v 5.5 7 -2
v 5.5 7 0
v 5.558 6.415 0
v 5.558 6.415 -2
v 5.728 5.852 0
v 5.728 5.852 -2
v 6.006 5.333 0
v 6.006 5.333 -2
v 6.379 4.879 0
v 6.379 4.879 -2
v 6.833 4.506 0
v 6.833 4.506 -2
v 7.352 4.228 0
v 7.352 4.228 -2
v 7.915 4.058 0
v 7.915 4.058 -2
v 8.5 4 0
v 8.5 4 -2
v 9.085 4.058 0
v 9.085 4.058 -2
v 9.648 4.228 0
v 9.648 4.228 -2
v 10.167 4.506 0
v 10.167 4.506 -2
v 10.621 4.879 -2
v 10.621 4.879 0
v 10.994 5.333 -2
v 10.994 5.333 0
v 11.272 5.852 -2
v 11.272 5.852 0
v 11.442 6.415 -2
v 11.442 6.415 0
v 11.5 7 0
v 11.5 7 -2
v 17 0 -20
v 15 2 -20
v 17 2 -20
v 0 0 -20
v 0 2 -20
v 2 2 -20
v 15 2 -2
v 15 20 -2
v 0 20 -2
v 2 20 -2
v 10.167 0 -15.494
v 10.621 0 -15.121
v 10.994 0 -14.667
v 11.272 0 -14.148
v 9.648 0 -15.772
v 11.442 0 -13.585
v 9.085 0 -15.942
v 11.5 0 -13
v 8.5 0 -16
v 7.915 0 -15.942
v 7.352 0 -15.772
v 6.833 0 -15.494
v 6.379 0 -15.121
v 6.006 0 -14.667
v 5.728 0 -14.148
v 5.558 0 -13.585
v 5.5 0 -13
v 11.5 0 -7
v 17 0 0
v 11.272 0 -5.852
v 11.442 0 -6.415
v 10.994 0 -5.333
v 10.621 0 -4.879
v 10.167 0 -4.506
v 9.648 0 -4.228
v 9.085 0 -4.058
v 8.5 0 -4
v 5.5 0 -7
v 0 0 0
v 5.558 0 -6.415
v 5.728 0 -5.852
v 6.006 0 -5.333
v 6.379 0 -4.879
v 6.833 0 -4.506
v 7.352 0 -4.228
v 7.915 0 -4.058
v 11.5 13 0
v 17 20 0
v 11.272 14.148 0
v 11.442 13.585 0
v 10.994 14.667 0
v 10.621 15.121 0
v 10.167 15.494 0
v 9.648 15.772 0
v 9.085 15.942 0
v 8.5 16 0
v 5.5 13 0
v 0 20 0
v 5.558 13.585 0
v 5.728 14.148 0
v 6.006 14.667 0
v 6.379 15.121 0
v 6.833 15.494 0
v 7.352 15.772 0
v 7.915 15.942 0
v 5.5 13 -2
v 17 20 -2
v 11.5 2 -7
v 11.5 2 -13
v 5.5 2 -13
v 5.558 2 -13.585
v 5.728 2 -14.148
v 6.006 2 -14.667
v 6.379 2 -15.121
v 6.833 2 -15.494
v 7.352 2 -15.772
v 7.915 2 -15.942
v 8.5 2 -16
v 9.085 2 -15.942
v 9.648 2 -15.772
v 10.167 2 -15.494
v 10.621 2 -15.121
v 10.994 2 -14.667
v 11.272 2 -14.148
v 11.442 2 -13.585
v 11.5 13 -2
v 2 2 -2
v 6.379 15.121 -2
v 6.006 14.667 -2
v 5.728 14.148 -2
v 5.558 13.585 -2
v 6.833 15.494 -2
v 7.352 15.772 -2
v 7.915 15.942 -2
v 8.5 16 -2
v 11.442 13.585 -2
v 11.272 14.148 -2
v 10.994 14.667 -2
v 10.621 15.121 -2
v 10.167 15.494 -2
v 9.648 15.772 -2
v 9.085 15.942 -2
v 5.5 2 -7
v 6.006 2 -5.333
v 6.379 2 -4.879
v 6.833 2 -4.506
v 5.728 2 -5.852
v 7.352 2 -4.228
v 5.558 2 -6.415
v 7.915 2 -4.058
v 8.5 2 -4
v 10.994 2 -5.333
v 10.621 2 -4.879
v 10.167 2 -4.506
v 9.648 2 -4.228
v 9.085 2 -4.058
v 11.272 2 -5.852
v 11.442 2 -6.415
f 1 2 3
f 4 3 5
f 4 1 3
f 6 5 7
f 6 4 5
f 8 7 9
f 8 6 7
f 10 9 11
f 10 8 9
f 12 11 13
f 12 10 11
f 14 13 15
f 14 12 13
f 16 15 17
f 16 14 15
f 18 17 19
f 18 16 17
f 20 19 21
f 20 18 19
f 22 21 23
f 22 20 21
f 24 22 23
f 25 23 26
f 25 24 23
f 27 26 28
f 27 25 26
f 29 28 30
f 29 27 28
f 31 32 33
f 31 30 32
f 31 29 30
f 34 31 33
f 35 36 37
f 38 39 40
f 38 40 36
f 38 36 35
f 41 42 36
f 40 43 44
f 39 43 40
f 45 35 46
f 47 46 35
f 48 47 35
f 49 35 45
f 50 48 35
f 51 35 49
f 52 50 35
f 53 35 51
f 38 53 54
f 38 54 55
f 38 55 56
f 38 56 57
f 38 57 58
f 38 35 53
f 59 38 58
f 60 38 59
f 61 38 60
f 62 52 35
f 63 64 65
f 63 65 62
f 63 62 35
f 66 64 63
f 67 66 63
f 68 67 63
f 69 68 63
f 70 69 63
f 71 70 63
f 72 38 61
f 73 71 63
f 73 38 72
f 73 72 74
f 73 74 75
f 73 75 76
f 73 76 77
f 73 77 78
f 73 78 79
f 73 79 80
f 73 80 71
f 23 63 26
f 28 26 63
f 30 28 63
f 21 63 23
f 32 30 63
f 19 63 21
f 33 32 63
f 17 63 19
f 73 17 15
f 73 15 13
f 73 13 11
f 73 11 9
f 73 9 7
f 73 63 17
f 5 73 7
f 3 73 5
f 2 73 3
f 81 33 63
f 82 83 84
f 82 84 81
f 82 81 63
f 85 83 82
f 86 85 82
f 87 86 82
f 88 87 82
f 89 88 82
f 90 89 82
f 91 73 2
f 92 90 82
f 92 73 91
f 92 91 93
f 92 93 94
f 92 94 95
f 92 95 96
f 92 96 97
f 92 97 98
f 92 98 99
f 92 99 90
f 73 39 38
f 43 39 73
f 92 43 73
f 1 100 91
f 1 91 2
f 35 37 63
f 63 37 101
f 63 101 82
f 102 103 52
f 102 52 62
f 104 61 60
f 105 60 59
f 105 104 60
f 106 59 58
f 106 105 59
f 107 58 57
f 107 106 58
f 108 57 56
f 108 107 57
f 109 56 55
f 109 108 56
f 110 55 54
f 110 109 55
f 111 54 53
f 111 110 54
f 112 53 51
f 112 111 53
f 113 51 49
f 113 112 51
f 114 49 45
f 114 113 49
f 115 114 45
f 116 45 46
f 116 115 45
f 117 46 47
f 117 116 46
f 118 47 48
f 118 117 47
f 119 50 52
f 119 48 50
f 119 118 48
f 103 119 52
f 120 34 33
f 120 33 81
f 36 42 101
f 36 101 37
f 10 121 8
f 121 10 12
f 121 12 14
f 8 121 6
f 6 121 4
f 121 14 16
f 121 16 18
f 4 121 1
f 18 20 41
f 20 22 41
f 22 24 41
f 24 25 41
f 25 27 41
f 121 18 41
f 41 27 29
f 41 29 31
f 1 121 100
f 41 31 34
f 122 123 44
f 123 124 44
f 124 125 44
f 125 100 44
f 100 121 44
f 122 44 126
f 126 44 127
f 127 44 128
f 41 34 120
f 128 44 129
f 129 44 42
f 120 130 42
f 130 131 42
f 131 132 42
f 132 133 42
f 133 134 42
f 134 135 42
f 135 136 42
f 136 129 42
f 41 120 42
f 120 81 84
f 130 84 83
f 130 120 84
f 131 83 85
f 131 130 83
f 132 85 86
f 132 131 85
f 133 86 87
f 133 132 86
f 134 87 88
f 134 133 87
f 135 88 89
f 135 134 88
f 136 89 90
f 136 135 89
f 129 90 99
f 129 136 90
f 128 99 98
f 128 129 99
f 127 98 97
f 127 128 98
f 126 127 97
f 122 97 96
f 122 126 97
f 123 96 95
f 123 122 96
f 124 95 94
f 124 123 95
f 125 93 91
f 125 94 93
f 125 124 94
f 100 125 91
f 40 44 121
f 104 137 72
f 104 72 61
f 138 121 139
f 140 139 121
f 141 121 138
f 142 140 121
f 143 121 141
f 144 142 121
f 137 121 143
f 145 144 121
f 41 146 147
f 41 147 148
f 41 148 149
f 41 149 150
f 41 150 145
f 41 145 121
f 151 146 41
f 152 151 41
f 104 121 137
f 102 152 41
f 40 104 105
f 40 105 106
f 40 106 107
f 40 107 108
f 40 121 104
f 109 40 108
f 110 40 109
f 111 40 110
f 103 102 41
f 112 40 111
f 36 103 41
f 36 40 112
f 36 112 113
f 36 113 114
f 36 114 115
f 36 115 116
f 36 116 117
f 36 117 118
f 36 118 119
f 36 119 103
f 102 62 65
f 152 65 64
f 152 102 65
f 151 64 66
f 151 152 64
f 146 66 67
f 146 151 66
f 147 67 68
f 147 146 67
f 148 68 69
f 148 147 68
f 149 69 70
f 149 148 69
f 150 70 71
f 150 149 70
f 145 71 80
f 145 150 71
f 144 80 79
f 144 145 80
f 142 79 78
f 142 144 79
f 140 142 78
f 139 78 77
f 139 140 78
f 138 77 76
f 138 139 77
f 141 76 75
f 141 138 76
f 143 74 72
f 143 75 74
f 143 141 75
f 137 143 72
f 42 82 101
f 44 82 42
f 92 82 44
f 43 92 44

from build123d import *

# Parameters (mm, degrees)
BOSS_EXTRUDE1_DEPTH = 17
SKETCH2_W           = 13
SKETCH2_H           = 18
CUT_EXTRUDE1_DEPTH  = 18
CUT_EXTRUDE2_REACH  = 33.828
CUT_EXTRUDE3_REACH  = 33.828


with BuildPart() as part:
    # Sketch1 → Boss-Extrude1 (new body)
    with BuildSketch(Plane(origin=(0, 0, 0), x_dir=(0, 0, -1), z_dir=(1, 0, 0))):
        Polygon((0, 0), (0, 20), (2, 20), (20, 2), (20, 0), align=None)
    extrude(amount=BOSS_EXTRUDE1_DEPTH)

    # Sketch2 → Cut-Extrude1 (cut)
    with BuildSketch(Plane(origin=(0, 20, 0), x_dir=(1, 0, 0), z_dir=(0, 1, 0))):
        with Locations((8.5, 11)):
            Rectangle(SKETCH2_W, SKETCH2_H)
    extrude(amount=-CUT_EXTRUDE1_DEPTH, mode=Mode.SUBTRACT)

    # Sketch3 → Cut-Extrude2 (cut, up to next)
    with BuildSketch(Plane(origin=(0, 0, -2), x_dir=(-1, 0, 0), z_dir=(0, 0, -1)), mode=Mode.PRIVATE) as cut_extrude2_sk1:
        with BuildLine():
            Line((-11.5, 7), (-11.5, 13))
            ThreePointArc((-11.5, 13), (-8.5, 16), (-5.5, 13))
            Line((-5.5, 13), (-5.5, 7))
            ThreePointArc((-5.5, 7), (-8.5, 4), (-11.5, 7))
        make_face()
    cut_extrude2_tool1 = extrude(cut_extrude2_sk1.sketch, amount=-CUT_EXTRUDE2_REACH, mode=Mode.PRIVATE) & part.part
    add(cut_extrude2_tool1.solids().sort_by_distance((8.5, 10, -2))[0], mode=Mode.SUBTRACT)

    # Sketch4 → Cut-Extrude3 (cut, up to next)
    with BuildSketch(Plane(origin=(0, 2, 0), x_dir=(1, 0, 0), z_dir=(0, 1, 0)), mode=Mode.PRIVATE) as cut_extrude3_sk1:
        with BuildLine():
            Line((11.5, 13), (11.5, 7))
            ThreePointArc((11.5, 7), (8.5, 4), (5.5, 7))
            Line((5.5, 7), (5.5, 13))
            ThreePointArc((5.5, 13), (8.5, 16), (11.5, 13))
        make_face()
    cut_extrude3_tool1 = extrude(cut_extrude3_sk1.sketch, amount=-CUT_EXTRUDE3_REACH, mode=Mode.PRIVATE) & part.part
    add(cut_extrude3_tool1.solids().sort_by_distance((8.5, 2, -10))[0], mode=Mode.SUBTRACT)


solid = part.part
